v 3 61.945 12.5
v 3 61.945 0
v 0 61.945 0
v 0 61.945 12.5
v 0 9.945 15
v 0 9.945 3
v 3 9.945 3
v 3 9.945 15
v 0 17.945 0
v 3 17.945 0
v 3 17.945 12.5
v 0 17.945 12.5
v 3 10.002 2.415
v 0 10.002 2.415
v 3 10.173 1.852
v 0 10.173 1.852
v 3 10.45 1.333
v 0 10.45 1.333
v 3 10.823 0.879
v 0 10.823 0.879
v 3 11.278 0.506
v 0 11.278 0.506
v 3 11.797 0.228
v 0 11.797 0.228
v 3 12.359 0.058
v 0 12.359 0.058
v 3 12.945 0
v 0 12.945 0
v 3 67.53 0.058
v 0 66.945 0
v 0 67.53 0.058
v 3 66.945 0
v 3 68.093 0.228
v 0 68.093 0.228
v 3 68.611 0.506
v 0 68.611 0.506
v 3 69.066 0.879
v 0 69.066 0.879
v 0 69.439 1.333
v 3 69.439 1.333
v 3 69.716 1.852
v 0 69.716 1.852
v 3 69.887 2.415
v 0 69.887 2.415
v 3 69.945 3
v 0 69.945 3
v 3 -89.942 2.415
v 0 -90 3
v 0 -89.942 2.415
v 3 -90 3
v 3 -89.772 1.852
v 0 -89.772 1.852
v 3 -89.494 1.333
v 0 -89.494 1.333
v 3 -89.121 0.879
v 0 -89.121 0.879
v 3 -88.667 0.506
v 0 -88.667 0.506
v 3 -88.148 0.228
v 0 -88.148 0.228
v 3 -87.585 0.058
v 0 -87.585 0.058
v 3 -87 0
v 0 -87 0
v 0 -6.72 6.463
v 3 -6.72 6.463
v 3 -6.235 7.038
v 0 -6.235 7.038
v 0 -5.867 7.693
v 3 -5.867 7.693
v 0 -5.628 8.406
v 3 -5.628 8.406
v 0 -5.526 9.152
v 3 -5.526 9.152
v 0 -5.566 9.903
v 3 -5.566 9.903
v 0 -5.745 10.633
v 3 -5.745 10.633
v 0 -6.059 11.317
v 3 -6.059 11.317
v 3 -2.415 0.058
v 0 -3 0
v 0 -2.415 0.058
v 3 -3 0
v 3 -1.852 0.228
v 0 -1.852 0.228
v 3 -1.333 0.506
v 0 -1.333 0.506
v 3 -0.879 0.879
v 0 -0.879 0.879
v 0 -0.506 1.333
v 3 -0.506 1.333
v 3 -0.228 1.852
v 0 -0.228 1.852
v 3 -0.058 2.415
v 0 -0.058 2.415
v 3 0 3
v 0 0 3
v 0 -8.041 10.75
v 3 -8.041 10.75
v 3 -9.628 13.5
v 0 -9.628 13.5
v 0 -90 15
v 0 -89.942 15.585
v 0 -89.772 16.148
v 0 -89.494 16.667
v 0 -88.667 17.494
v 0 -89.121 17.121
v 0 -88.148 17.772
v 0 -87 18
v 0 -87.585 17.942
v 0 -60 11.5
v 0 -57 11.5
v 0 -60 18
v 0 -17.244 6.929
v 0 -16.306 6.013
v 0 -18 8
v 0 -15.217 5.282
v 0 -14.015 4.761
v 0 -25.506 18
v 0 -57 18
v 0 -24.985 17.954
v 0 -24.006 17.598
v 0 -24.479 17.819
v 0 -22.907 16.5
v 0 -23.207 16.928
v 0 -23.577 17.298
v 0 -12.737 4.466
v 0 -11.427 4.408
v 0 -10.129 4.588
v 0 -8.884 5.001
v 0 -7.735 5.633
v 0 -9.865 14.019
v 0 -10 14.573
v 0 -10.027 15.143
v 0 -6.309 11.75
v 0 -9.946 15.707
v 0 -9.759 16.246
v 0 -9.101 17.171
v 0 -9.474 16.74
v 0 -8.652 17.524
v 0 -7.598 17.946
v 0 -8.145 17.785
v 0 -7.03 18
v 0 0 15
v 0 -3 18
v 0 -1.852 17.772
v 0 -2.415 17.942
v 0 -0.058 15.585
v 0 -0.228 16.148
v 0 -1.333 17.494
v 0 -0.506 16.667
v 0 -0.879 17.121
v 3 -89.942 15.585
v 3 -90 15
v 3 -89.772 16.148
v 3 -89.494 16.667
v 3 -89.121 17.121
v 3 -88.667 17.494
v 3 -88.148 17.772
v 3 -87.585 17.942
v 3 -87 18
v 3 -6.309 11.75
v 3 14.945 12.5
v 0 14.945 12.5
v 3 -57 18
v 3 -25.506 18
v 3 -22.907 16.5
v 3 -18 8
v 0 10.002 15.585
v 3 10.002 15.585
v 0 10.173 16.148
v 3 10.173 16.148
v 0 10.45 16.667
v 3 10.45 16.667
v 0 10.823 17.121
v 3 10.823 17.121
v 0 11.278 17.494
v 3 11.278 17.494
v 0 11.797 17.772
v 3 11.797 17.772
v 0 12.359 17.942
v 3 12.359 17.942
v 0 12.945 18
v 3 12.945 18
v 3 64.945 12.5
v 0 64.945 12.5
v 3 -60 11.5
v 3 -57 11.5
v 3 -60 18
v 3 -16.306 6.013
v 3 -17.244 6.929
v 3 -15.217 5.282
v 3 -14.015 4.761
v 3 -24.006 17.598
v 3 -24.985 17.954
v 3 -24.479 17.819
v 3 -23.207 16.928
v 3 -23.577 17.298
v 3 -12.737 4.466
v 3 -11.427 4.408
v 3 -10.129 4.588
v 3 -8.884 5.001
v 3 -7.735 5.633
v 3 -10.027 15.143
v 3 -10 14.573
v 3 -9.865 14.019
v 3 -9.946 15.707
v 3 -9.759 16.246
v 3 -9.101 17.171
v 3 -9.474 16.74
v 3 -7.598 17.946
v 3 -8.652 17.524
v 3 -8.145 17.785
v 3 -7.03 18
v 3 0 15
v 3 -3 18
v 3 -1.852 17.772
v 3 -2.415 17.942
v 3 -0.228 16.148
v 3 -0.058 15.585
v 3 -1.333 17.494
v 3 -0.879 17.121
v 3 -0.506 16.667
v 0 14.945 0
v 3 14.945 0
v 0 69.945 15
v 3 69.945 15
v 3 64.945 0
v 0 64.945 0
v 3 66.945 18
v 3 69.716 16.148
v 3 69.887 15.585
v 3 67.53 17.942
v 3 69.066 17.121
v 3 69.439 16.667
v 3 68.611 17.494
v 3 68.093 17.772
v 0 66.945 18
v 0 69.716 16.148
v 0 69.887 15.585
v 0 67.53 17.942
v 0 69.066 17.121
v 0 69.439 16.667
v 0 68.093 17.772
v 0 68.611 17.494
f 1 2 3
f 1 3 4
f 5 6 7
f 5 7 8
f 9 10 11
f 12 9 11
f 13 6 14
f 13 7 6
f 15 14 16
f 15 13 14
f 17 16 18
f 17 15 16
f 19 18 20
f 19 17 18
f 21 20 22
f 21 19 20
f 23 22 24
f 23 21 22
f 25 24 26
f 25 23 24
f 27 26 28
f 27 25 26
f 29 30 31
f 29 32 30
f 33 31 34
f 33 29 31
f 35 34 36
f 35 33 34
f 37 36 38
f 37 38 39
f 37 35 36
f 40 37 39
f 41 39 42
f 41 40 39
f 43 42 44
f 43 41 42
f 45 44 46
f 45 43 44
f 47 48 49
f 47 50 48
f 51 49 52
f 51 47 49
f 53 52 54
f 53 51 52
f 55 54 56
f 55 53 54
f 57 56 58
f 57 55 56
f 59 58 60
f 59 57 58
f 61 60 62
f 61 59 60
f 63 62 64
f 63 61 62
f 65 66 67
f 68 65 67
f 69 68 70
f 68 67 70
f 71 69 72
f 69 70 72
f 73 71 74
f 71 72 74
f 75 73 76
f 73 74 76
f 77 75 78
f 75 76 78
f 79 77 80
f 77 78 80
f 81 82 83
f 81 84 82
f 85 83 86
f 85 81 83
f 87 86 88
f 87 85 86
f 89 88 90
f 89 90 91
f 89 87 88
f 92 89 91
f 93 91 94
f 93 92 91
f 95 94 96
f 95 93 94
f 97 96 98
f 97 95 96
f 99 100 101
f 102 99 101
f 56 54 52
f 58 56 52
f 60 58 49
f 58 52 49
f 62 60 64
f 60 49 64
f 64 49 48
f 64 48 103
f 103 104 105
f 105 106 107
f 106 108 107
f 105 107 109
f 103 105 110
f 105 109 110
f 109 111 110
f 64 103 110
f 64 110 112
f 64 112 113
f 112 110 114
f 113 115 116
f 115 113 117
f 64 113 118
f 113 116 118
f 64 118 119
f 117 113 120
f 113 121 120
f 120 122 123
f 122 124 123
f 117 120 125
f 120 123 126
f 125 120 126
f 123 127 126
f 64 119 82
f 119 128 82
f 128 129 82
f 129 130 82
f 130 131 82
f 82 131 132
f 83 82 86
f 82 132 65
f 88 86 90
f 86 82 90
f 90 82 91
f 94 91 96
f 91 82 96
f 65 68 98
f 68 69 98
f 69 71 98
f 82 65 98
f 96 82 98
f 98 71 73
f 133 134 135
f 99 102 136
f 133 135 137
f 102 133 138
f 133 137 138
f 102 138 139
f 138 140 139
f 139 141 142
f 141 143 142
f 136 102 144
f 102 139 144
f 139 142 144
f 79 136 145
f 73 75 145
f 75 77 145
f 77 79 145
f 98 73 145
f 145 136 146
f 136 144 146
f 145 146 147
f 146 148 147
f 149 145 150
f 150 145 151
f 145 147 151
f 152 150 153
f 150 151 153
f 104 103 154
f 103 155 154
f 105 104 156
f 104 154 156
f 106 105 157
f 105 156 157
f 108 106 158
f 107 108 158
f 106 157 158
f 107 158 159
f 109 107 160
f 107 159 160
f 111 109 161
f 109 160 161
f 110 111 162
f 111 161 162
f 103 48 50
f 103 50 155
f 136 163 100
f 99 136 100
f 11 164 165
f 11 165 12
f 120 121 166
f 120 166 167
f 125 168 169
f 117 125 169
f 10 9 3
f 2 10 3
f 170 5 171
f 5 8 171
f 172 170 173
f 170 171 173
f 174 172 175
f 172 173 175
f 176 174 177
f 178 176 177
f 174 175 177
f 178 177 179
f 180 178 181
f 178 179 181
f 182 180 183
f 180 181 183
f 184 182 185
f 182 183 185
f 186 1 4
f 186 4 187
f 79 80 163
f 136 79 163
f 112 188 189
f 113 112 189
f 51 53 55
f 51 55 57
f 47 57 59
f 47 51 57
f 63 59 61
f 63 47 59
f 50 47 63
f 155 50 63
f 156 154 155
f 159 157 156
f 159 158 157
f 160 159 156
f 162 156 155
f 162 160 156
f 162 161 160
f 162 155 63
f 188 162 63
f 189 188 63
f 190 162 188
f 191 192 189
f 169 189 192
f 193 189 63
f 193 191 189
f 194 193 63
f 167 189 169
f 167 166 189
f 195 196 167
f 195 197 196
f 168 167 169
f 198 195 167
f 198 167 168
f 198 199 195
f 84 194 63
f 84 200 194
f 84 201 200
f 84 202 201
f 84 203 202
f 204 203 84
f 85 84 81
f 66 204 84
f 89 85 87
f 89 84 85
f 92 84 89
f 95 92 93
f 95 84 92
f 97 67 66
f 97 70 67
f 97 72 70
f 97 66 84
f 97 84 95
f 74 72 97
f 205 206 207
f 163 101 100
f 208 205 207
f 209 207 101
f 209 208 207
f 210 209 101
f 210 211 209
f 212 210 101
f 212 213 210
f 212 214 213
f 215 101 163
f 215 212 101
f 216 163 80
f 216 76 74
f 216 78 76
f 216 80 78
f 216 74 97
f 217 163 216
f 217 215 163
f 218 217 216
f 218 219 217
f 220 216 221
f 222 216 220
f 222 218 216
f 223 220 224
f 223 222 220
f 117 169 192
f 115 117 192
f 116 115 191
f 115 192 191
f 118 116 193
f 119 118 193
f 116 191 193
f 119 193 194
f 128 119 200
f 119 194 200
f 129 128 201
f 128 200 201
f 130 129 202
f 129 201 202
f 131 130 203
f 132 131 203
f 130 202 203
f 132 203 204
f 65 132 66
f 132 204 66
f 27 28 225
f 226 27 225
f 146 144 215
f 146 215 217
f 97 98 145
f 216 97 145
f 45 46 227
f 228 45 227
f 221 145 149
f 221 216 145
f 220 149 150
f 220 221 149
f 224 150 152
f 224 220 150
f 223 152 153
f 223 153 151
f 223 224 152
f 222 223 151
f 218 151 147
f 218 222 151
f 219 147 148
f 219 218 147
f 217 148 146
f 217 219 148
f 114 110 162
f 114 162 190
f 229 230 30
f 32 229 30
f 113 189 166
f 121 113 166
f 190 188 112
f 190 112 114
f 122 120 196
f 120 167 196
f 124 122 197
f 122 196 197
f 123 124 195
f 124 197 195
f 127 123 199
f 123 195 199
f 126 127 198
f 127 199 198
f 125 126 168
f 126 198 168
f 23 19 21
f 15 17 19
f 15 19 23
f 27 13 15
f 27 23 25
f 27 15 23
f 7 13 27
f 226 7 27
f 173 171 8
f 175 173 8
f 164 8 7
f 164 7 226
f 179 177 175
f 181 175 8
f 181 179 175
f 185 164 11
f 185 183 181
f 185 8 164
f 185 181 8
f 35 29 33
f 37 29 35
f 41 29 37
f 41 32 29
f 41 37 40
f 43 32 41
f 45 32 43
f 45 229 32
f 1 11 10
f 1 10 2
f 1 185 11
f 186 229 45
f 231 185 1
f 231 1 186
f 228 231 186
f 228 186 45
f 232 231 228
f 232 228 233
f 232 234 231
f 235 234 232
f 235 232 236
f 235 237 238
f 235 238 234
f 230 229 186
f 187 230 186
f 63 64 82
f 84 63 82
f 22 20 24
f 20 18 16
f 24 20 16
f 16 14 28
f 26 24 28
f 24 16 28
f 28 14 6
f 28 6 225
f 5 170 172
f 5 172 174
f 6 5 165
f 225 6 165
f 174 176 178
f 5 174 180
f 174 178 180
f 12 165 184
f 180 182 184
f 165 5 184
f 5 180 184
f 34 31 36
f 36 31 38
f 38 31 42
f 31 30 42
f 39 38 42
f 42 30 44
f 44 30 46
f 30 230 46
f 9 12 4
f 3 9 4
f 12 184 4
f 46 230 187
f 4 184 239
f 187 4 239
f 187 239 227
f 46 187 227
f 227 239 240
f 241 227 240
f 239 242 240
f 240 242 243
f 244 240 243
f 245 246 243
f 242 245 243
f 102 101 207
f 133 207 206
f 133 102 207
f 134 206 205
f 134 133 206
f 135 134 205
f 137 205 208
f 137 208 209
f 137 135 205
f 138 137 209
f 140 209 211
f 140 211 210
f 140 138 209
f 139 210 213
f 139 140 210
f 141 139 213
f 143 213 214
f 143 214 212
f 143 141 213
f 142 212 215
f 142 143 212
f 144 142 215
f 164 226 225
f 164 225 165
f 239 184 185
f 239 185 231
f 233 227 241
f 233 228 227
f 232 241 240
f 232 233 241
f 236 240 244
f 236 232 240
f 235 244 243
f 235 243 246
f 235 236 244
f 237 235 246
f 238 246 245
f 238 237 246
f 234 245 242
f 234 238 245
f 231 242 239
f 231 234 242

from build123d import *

# Parameters (mm, degrees)
F0_W     = 90
F0_H     = 18
F1_DEPTH = 3
F0_W_2   = 60
F3_DEPTH = 3.001
F4_R     = 3
F4_2_R   = 3
F5_W     = 3
F5_H     = 6.5
F5_H_2   = 12.5
F6_DEPTH = 3.001


with BuildPart() as f1:
    # F0 (on Right) → F1 (new body)
    with BuildSketch(Plane.YZ):
        with Locations((-45, 9)):
            Rectangle(F0_W, F0_H)
    extrude(amount=F1_DEPTH)

    # F2 (on face) → F3 (cut, through all)
    with BuildSketch(Plane.YZ.offset(3)):
        with BuildLine():
            Line((-18.9529946162, 29.6506350946), (-30.5, 29.6506350946))
            Line((-30.5, 29.6506350946), (-18, 8))
            ThreePointArc((-18, 8), (-12.736943817, 4.4659562139), (-6.7200863544, 6.4626164608))
            ThreePointArc((-6.7200863544, 6.4626164608), (-5.5592457723, 8.7765369135), (-6.0585018161, 11.316718427))
            Line((-6.0585018161, 11.316718427), (-6.3085018161, 11.7497311289))
            Line((-6.3085018161, 11.7497311289), (-8.0405526237, 10.7497311289))
            Line((-8.0405526237, 10.7497311289), (-18.9529946162, 29.6506350946))
        make_face()
    extrude(amount=-F3_DEPTH, mode=Mode.SUBTRACT)

    # F4
    f4_edges = [f1.edges().sort_by_distance(p)[0] for p in [
        (1.5, -12.226497, 18),
        (1.5, 0, 18),
        (1.5, -23.773503, 18),
        (1.5, 0, 0),
        (1.5, -90, 18),
        (1.5, -90, 0),
    ]]
    fillet(f4_edges, radius=F4_R)


with BuildPart() as f1b:
    # F0 (on Right) → F1, piece 2 (new body)
    with BuildSketch(Plane.YZ):
        with Locations((39.9446233362, 9)):
            Rectangle(F0_W_2, F0_H)
    extrude(amount=F1_DEPTH)

    # F4#2
    f4_2_edges = [f1b.edges().sort_by_distance(p)[0] for p in [
        (1.5, 69.944623, 18),
        (1.5, 69.944623, 0),
        (1.5, 9.944623, 0),
        (1.5, 9.944623, 18),
    ]]
    fillet(f4_2_edges, radius=F4_2_R)


with BuildPart() as f6_tool:
    # F5 (on face) → F6 (new body, through all)
    with BuildSketch(Plane.YZ.offset(3)):
        with Locations((-58.5, 14.75)):
            Rectangle(F5_W, F5_H)
        with Locations((16.4446233362, 6.25)):
            Rectangle(F5_W, F5_H_2)
        with Locations((63.4446233362, 6.25)):
            Rectangle(F5_W, F5_H_2)
    extrude(amount=-F6_DEPTH)


with BuildPart() as f1_1:
    add(f1.part)

    # F6: cut by f6_tool
    add(f6_tool.part, mode=Mode.SUBTRACT)


with BuildPart() as f1b_1:
    add(f1b.part)

    # F6: cut by f6_tool
    add(f6_tool.part, mode=Mode.SUBTRACT)


solid = Compound([f1_1.part, f1b_1.part])
